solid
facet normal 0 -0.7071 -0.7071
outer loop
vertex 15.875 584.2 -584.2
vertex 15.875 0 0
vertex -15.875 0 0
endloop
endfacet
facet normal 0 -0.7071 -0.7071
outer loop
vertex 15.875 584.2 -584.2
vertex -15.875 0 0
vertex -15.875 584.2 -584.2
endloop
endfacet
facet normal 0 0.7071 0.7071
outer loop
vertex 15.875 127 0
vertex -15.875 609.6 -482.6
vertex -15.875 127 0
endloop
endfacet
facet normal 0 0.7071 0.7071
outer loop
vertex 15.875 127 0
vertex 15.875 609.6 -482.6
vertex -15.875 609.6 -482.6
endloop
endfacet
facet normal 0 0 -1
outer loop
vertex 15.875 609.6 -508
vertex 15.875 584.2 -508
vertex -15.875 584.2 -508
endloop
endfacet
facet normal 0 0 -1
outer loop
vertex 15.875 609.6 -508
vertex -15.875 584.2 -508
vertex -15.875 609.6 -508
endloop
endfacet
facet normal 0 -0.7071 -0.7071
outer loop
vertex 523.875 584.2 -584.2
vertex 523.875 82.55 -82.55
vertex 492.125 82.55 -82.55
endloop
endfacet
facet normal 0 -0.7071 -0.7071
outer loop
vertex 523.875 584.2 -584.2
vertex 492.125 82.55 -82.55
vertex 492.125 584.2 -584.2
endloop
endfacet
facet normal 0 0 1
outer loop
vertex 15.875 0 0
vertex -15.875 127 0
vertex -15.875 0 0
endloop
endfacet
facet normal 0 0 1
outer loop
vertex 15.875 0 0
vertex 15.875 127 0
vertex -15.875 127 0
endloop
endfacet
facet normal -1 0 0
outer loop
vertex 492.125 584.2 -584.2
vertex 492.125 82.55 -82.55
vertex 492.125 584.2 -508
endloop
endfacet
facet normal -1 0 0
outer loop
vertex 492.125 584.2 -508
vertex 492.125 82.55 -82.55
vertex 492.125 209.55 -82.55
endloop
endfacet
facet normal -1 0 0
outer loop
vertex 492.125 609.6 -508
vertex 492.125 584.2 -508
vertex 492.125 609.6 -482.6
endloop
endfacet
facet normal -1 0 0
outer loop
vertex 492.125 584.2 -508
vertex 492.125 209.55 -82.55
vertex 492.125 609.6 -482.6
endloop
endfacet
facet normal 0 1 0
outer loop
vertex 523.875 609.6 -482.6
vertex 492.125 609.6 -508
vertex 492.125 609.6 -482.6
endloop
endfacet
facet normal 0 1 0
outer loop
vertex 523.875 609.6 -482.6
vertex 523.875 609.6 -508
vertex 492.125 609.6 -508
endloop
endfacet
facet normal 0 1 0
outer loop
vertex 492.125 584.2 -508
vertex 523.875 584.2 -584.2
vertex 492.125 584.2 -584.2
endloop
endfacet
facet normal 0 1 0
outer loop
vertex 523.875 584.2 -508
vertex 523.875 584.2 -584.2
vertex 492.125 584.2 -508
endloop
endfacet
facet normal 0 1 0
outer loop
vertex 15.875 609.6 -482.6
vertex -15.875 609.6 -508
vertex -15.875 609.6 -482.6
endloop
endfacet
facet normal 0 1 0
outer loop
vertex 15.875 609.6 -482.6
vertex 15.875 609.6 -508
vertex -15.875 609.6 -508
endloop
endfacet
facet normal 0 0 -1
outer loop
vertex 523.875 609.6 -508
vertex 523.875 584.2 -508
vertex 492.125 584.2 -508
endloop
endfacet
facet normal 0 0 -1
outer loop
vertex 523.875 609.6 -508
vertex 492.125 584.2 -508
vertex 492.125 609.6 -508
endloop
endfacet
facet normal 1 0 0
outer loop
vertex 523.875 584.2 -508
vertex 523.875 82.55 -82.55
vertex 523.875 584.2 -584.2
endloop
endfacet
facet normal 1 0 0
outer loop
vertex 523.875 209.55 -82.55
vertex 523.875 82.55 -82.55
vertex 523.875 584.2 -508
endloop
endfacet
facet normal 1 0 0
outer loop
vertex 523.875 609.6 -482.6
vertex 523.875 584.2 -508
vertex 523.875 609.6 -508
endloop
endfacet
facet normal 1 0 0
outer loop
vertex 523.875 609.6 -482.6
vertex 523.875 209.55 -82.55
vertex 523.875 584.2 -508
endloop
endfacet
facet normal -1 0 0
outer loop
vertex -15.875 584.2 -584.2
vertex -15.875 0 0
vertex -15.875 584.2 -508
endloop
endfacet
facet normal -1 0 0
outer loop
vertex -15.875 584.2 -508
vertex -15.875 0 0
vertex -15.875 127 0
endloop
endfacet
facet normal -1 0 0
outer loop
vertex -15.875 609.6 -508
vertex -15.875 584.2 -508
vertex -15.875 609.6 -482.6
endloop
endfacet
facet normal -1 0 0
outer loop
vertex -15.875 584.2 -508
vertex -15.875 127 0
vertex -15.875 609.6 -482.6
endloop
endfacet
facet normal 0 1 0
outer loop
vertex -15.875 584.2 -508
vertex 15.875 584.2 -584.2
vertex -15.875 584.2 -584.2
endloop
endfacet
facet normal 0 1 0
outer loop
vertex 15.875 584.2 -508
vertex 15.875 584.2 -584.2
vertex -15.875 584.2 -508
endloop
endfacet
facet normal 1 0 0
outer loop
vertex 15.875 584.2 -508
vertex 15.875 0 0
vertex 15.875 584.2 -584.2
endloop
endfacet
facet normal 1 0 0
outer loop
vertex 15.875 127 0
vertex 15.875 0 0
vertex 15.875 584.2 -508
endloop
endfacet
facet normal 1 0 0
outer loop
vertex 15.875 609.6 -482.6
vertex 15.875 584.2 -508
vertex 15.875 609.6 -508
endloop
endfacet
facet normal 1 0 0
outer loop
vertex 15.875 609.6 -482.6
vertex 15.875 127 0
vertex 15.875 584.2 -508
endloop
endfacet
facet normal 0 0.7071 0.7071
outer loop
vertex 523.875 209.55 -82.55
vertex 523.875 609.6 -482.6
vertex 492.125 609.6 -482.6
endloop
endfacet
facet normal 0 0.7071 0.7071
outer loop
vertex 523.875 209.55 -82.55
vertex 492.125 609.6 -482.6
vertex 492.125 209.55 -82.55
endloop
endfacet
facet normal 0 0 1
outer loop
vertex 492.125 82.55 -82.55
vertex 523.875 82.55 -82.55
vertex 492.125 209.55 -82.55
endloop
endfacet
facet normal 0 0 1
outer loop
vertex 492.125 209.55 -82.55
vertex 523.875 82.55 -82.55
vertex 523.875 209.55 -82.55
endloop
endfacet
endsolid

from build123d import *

# Parameters (mm, degrees)
F1_DEPTH = 15.875
F3_W     = 209.55
F3_H     = 82.55
F4_DEPTH = 31.75


with BuildPart() as f1:
    # F0 (on Right) → F1 (new body, symmetric)
    with BuildSketch(Plane.YZ):
        Polygon((127, 0), (0, 0), (584.2, -584.2), (584.2, -508), (609.6, -508), (609.6, -482.6), align=None)
    extrude(amount=F1_DEPTH, both=True)


with BuildPart() as f2_1:
    # F2: copy of F1
    add(f1.part.moved(Location((508, 0, 0))))

    # F3 (on face) → F4 (cut)
    with BuildSketch(Plane.YZ.offset(523.875)):
        with Locations((104.775, -41.275)):
            Rectangle(F3_W, F3_H)
    extrude(amount=-F4_DEPTH, mode=Mode.SUBTRACT)


solid = Compound([f1.part, f2_1.part])
